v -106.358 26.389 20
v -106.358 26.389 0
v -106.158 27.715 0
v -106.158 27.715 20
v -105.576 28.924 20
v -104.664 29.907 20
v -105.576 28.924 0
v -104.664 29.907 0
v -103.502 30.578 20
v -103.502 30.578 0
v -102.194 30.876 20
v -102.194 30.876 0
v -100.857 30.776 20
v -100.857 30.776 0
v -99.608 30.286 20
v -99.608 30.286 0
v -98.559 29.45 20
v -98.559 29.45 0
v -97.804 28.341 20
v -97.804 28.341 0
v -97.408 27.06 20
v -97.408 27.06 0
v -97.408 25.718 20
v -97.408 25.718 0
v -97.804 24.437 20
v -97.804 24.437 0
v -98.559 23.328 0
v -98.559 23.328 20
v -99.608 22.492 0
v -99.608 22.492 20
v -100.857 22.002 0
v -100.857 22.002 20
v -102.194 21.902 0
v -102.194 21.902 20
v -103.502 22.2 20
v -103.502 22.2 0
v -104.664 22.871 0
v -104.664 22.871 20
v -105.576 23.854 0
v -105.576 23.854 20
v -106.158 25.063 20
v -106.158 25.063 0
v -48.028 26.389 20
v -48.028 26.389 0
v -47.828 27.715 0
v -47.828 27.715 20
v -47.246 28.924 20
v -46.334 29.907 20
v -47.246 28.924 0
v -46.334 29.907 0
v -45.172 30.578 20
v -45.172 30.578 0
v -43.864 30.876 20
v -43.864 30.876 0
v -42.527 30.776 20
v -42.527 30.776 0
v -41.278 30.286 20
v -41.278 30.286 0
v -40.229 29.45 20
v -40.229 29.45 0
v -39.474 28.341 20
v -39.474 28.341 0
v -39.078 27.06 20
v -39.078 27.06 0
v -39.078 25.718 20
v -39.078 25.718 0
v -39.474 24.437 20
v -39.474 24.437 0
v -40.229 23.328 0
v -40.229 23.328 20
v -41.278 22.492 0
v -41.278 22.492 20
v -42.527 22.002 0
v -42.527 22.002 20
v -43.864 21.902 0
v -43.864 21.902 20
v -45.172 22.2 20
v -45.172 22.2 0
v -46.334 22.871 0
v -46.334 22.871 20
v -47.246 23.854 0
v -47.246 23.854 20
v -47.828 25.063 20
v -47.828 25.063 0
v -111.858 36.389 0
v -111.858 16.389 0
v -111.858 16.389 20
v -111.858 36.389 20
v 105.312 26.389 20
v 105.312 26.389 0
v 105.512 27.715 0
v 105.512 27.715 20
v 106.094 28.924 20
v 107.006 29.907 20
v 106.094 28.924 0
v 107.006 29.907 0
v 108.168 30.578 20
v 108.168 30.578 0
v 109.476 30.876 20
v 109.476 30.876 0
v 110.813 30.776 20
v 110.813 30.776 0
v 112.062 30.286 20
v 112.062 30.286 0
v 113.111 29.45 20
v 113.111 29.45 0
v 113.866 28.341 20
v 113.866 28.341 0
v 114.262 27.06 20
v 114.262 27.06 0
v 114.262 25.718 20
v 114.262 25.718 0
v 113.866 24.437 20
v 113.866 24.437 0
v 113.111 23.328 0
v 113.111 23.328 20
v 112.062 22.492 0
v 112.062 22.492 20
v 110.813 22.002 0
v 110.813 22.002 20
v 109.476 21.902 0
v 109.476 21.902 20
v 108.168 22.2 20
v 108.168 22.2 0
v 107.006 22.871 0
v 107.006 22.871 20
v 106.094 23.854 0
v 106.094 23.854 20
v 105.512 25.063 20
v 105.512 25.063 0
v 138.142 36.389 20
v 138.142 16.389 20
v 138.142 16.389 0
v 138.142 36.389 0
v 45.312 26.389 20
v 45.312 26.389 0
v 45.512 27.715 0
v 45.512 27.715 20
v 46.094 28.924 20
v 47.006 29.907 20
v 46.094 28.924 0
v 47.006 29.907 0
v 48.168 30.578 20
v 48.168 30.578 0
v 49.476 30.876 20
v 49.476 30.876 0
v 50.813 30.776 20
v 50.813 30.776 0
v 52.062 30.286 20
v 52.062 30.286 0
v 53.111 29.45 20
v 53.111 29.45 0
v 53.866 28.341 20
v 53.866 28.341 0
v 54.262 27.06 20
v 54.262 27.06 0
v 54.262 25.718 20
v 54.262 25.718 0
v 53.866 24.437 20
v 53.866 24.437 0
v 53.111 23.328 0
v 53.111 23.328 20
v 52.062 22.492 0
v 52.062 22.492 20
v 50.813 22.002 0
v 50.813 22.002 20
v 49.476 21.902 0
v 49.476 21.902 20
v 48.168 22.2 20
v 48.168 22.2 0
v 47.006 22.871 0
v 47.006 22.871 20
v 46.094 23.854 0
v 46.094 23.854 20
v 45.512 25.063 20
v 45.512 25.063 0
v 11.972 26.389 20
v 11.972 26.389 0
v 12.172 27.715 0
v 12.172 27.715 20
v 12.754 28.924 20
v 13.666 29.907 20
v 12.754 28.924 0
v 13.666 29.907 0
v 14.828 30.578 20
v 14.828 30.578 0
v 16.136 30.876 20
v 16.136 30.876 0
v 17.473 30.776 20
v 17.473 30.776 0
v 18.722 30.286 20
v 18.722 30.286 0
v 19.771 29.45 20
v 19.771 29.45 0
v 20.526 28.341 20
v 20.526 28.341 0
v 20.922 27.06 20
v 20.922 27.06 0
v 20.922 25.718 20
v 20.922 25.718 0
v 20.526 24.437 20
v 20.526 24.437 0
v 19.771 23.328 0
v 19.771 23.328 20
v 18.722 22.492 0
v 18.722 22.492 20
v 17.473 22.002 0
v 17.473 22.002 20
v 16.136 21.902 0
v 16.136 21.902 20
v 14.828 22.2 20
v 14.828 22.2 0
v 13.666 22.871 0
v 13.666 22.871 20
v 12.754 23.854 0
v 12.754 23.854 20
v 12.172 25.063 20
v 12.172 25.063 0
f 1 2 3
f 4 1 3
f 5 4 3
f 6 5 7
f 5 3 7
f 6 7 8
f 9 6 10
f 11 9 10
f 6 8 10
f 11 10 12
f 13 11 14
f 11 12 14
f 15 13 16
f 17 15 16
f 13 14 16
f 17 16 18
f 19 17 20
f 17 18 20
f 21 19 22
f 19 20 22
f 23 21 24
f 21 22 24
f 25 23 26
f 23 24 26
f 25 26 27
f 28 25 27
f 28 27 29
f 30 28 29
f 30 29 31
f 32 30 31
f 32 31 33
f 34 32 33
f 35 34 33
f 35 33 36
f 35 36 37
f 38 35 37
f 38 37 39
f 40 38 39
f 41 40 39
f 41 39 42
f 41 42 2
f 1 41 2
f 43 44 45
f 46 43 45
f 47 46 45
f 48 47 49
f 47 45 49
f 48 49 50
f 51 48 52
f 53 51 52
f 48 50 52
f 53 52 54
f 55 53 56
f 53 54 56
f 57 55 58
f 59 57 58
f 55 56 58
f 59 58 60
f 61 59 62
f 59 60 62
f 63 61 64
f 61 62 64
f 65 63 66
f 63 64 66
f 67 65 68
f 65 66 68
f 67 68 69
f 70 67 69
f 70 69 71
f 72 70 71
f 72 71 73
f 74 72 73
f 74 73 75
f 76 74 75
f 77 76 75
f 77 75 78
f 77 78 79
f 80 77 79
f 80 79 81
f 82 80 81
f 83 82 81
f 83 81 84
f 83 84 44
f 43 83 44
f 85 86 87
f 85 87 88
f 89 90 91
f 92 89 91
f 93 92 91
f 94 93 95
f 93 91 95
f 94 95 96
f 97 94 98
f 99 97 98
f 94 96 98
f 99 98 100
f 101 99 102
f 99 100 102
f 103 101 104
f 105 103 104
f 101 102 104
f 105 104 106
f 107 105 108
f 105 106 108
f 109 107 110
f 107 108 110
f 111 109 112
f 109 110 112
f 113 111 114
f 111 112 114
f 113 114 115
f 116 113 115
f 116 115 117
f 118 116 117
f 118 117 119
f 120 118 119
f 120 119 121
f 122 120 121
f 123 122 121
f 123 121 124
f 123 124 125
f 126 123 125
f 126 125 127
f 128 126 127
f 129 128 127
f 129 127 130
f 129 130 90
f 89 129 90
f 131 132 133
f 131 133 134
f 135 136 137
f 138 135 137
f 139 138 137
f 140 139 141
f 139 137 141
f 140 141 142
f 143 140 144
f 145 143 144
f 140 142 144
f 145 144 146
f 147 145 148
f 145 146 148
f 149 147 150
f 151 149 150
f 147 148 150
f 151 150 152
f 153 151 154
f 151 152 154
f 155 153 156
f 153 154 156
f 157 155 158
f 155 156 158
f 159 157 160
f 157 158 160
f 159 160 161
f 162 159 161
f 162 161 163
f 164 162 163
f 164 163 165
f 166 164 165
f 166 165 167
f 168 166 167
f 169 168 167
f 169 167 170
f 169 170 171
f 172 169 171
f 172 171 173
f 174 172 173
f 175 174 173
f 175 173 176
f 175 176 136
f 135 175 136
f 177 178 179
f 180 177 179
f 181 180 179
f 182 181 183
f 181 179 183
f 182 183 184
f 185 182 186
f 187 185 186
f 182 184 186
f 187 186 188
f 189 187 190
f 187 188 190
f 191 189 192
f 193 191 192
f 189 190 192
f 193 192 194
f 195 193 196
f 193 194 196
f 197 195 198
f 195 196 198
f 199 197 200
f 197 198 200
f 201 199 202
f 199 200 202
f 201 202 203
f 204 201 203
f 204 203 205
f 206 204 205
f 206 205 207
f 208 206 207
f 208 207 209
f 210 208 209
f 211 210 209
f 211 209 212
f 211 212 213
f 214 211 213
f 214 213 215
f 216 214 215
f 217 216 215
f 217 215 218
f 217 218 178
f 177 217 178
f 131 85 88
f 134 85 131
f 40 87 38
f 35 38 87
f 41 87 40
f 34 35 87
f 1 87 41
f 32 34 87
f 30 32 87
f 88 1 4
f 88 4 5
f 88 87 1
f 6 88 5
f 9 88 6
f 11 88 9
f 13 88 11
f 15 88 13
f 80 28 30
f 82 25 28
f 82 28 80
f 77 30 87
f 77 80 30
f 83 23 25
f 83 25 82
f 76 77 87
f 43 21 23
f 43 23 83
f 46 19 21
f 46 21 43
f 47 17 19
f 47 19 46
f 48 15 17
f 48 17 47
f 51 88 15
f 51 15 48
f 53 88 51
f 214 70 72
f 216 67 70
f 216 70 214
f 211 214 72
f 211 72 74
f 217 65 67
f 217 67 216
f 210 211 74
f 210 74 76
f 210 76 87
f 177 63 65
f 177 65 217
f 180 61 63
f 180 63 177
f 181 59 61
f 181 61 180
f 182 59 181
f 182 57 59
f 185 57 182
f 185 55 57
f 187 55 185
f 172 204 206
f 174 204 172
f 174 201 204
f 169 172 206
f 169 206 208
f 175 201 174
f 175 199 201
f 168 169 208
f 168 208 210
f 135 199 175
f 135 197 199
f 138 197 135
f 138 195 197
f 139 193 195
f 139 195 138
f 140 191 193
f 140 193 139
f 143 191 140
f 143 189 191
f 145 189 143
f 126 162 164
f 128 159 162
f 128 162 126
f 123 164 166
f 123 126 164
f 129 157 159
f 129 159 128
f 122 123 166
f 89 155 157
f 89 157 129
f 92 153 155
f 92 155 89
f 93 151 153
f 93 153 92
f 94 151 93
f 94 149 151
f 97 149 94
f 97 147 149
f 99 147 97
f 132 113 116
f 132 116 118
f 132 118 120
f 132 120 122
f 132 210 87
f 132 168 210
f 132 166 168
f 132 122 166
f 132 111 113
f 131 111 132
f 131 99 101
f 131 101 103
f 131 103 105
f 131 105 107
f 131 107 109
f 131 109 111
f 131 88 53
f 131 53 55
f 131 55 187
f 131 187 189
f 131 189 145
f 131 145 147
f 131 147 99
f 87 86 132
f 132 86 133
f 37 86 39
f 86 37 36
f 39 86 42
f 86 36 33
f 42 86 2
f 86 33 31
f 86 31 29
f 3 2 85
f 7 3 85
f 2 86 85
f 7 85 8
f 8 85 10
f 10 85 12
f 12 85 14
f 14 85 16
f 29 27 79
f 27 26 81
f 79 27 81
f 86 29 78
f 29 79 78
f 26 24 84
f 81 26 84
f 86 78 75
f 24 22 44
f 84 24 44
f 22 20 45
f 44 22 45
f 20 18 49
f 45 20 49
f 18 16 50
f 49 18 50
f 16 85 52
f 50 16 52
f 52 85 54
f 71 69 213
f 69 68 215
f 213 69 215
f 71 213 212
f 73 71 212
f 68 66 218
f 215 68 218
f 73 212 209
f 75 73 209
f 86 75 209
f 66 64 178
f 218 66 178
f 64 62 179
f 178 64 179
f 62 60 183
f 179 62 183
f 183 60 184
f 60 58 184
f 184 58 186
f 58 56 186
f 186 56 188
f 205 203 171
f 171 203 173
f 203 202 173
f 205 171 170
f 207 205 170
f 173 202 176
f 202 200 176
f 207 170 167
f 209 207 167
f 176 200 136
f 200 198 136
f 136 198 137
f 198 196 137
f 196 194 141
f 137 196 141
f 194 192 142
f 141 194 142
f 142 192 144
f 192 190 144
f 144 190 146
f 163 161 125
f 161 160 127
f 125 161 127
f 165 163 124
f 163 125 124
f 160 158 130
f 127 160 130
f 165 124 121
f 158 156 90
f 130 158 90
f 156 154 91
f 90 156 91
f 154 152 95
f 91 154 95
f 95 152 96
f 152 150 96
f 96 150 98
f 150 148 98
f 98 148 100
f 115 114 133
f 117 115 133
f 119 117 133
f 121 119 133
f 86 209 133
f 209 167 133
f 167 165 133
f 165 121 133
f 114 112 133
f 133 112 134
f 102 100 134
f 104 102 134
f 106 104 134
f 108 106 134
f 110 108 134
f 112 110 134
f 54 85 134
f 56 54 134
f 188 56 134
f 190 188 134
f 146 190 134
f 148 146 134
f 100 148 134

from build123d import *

# Parameters (mm, degrees)
F0_W     = 350
F0_H     = 20
F1_DEPTH = 20
F3_D     = 9
F5_D     = 9
F7_D     = 9
F8_W     = 100
F8_H     = 20
F8_R     = 4.5
F9_DEPTH = 25


with BuildPart() as f1:
    # F0 (on Top) → F1 (new body)
    with BuildSketch(Plane.XY):
        with Locations((63.1421148777, 26.3889993745)):
            Rectangle(F0_W, F0_H)
    extrude(amount=F1_DEPTH)

    # F3 (through all)
    with Locations(Plane.XY.offset(20)):
        with Locations((-43.5278851223, 26.3889993745), (49.8121148777, 26.3889993745)):
            Hole(F3_D / 2)

    # F5 (through all)
    with Locations(Plane.XY.offset(20)):
        with Locations((-101.8578851223, 26.3889993745), (228.1421148777, 26.3889993745)):
            Hole(F5_D / 2)

    # F7 (through all)
    with Locations(Plane.XY.offset(20)):
        with Locations((16.4721148777, 26.3889993745), (109.8121148777, 26.3889993745)):
            Hole(F7_D / 2)

    # F8 (on face) → F9 (cut)
    with BuildSketch(Plane.XY.offset(20)):
        with Locations((188.1421148777, 26.3889993745)):
            Rectangle(F8_W, F8_H)
        with Locations((228.1421148777, 26.3889993745)):
            Circle(F8_R, mode=Mode.SUBTRACT)
    extrude(amount=-F9_DEPTH, mode=Mode.SUBTRACT)


solid = f1.part
